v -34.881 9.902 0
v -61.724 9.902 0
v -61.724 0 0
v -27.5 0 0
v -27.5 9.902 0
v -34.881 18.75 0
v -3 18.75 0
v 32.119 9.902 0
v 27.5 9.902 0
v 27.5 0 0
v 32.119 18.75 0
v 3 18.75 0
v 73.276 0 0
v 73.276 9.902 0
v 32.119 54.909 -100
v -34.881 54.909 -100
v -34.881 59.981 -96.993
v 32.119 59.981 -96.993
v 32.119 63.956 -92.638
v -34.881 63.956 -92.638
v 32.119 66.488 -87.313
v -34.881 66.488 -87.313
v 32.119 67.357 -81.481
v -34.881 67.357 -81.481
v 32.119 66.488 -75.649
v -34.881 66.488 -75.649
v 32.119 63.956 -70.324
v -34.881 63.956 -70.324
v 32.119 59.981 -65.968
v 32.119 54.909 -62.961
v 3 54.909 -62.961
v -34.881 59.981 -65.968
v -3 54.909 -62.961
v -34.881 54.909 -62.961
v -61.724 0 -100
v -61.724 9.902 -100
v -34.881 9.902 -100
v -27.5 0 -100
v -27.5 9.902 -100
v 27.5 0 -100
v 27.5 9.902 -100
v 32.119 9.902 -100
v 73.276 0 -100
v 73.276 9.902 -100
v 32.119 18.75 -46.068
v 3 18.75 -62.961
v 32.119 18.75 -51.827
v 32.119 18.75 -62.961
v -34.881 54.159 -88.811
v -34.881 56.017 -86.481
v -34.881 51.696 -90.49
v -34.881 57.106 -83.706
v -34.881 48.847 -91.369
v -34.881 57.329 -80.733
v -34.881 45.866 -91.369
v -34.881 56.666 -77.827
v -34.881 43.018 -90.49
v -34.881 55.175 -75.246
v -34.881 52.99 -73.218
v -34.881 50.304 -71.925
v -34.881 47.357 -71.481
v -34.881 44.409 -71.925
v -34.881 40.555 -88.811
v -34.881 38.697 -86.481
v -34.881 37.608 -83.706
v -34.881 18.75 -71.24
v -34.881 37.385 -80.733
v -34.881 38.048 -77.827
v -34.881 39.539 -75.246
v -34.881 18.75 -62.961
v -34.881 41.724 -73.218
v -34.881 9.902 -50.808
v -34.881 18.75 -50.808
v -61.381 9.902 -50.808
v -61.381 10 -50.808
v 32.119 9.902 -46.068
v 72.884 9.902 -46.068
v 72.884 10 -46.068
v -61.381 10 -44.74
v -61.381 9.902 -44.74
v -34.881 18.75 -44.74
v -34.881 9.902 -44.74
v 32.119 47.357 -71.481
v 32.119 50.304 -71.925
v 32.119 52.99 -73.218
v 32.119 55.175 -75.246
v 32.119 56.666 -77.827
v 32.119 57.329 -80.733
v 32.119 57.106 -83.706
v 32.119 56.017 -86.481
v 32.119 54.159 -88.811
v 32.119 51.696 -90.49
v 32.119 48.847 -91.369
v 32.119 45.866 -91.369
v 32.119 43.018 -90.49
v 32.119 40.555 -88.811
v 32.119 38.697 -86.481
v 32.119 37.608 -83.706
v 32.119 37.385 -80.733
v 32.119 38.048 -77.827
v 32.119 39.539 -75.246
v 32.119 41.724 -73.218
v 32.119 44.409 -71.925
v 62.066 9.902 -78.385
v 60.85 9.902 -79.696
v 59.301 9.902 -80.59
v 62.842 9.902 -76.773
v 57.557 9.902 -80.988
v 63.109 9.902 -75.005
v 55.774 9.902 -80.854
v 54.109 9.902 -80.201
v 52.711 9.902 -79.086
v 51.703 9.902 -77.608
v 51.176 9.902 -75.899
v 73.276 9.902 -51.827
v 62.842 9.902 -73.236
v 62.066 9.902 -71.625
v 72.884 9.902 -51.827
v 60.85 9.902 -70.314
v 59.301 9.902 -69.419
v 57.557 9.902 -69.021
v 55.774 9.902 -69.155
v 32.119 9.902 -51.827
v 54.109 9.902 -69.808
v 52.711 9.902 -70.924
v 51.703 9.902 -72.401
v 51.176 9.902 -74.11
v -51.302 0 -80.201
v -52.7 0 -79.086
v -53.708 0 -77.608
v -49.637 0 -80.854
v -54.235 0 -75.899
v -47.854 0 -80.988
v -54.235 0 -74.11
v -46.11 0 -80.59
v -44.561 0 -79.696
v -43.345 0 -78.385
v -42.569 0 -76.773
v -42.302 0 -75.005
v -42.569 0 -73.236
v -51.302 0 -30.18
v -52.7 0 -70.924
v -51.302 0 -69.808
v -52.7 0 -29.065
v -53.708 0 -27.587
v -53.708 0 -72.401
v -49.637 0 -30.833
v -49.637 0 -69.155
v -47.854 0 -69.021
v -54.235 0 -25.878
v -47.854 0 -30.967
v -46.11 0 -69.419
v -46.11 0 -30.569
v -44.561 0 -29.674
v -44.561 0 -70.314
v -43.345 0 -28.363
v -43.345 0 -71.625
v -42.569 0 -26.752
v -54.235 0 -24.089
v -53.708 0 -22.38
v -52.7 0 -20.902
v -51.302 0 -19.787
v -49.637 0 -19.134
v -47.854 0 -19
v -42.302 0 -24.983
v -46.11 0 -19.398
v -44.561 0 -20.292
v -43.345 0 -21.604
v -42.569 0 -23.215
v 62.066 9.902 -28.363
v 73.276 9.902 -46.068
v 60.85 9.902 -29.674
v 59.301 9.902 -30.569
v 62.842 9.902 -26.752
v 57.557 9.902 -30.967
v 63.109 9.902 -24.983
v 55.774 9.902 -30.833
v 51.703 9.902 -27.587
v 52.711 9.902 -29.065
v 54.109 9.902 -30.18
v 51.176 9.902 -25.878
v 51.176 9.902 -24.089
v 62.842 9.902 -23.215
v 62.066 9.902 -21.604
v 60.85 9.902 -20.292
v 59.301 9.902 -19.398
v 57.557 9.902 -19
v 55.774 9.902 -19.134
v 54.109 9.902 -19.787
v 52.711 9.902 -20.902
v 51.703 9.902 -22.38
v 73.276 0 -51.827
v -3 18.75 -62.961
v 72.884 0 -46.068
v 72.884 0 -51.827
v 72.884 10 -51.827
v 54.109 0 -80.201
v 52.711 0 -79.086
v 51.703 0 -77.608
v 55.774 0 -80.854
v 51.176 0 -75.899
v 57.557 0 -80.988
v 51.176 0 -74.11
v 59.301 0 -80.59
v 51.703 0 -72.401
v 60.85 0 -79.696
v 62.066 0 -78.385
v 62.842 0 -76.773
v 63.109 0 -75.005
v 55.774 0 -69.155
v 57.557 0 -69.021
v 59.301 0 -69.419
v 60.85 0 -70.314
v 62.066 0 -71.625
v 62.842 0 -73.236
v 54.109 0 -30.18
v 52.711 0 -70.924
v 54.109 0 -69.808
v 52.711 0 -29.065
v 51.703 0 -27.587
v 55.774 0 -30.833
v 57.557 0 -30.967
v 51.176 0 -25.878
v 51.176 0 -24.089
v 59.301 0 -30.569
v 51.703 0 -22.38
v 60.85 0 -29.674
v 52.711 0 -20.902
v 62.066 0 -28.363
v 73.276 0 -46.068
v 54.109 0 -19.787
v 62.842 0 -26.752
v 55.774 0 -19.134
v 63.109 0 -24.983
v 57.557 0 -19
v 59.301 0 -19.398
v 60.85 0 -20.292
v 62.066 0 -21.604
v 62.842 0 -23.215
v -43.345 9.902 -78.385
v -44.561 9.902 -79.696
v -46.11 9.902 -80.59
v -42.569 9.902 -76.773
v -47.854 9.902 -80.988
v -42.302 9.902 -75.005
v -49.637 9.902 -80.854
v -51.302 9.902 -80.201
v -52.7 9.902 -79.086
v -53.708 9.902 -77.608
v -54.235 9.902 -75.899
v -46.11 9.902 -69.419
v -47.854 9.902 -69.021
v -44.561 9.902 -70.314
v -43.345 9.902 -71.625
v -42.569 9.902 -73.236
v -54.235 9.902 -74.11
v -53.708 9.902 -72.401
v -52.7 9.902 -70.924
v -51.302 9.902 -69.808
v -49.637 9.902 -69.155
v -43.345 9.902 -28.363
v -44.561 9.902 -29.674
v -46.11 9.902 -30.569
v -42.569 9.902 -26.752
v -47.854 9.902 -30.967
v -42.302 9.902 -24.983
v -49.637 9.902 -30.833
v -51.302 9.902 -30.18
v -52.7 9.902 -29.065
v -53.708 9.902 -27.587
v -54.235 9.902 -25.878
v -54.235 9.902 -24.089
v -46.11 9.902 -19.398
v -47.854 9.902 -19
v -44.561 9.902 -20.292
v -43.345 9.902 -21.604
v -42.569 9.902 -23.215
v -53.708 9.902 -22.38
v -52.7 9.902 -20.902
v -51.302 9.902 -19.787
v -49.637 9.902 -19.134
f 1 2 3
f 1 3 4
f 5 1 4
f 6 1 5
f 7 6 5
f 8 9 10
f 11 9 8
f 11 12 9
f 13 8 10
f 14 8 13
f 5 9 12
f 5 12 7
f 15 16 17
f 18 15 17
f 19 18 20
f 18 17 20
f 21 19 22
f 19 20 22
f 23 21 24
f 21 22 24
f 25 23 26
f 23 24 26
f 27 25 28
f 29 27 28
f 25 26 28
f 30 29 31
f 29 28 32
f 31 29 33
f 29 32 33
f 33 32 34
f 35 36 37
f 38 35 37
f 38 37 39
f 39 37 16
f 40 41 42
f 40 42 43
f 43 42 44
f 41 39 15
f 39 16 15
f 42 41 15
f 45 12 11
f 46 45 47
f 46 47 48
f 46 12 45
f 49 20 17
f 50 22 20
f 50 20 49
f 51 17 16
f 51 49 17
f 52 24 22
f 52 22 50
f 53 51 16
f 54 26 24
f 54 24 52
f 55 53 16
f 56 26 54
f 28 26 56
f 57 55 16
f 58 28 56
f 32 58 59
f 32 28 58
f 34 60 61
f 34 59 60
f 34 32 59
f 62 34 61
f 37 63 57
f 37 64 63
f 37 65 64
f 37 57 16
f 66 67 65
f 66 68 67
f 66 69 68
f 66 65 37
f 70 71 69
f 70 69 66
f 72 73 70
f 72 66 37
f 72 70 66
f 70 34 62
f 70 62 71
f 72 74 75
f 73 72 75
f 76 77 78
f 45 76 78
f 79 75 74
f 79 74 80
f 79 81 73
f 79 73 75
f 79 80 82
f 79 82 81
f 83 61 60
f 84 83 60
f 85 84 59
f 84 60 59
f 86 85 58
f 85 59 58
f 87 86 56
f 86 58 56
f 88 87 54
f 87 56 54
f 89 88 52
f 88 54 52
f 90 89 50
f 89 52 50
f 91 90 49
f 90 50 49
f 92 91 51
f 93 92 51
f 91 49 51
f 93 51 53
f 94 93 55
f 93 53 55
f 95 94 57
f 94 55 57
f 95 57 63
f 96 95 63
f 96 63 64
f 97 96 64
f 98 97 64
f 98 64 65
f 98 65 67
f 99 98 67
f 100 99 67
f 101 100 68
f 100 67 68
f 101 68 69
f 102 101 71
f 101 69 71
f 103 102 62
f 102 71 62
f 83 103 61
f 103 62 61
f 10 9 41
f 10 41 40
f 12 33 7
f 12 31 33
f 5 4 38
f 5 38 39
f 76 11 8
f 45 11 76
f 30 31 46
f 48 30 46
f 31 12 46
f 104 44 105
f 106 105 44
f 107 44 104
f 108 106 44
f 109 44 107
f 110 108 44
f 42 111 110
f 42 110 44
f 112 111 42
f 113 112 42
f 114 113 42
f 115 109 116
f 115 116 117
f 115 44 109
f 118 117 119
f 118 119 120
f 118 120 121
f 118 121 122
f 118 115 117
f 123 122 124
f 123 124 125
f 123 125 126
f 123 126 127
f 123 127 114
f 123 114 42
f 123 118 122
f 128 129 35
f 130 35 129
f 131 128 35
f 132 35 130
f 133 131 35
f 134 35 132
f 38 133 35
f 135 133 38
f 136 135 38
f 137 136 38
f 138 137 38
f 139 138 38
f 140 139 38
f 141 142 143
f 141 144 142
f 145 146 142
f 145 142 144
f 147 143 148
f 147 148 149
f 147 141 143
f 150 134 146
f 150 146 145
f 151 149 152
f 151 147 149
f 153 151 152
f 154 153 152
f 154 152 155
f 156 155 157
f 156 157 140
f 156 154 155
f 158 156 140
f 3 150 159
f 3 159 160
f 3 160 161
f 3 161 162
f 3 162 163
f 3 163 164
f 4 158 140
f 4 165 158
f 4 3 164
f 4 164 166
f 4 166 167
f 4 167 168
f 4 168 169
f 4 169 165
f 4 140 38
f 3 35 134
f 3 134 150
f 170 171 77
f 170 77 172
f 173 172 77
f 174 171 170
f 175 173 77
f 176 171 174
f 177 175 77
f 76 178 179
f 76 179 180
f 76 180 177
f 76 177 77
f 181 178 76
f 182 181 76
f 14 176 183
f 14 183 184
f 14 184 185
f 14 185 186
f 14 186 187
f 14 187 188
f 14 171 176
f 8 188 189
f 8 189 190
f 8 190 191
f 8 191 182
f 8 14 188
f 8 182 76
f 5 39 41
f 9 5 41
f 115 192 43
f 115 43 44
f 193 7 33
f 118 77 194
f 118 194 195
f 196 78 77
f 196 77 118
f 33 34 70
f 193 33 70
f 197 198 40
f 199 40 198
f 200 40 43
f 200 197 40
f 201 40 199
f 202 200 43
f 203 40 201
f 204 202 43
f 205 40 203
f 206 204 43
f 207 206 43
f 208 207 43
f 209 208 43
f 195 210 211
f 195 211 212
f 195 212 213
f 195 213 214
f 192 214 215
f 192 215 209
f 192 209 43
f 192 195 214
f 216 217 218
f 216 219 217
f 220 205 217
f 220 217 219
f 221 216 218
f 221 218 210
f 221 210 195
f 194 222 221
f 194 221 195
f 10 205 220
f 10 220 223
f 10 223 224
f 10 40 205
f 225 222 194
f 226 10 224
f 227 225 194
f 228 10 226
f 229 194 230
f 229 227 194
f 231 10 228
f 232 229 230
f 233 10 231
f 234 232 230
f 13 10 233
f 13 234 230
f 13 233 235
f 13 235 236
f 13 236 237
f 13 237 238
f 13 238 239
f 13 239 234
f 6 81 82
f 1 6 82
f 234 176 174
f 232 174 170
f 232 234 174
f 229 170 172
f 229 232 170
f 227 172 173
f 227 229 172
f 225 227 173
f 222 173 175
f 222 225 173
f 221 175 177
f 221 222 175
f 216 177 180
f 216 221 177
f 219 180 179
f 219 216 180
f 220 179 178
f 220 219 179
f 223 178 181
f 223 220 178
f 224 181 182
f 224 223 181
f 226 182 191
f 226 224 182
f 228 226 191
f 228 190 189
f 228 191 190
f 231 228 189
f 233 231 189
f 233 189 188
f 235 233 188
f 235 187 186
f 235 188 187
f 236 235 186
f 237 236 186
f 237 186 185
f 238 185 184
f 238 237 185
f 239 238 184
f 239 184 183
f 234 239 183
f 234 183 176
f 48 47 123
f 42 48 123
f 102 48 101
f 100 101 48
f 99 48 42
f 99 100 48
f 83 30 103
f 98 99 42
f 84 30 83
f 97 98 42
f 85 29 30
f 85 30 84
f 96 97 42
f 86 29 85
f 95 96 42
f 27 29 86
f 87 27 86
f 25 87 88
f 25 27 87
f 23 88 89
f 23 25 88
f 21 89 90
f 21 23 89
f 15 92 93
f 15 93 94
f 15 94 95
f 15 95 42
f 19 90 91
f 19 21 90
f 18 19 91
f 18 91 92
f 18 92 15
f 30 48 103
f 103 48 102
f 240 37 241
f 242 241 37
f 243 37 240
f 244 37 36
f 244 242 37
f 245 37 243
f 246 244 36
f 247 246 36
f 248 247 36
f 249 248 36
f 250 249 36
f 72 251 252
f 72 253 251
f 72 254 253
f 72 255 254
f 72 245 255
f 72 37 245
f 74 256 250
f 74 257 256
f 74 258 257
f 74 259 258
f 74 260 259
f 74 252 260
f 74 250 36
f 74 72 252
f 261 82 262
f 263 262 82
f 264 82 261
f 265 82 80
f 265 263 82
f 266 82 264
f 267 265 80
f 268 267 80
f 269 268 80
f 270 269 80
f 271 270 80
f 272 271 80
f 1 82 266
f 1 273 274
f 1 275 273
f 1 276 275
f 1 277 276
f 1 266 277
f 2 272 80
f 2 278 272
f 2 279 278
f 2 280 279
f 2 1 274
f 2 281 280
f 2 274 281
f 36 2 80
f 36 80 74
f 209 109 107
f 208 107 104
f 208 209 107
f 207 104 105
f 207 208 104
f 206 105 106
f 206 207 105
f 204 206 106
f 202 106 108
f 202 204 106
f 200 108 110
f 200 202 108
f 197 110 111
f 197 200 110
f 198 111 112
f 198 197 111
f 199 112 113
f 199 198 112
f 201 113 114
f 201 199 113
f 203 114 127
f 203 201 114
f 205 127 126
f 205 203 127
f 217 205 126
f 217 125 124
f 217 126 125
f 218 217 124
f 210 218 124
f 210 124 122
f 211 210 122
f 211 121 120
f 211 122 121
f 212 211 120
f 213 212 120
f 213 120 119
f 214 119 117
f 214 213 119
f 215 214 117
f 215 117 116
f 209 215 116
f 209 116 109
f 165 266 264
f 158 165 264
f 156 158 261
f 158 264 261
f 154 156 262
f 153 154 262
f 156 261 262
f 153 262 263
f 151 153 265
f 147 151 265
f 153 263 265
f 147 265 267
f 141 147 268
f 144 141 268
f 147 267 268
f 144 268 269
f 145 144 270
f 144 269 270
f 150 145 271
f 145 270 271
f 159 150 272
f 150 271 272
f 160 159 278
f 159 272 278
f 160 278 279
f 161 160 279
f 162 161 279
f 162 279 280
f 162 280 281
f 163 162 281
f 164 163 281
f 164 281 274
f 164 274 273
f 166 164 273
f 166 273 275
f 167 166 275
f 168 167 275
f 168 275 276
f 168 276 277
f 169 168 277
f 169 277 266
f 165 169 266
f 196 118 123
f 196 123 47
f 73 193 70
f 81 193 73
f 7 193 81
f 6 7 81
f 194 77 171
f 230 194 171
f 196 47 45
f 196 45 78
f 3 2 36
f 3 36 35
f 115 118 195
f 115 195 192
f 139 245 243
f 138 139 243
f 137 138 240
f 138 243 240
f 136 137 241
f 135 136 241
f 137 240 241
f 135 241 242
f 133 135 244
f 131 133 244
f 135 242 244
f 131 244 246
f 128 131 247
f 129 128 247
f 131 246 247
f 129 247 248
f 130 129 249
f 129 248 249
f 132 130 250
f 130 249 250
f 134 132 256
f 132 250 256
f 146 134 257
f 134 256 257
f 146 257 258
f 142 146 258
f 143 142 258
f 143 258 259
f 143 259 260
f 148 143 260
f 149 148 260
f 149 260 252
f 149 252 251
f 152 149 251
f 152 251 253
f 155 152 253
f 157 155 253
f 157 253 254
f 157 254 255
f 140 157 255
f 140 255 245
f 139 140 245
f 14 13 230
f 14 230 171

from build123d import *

# Parameters (mm, degrees)
BOSS_EXTRUDE1_DEPTH     = 100
SKETCH2_R               = 10
BOSS_EXTRUDE2_DEPTH     = 67
SKETCH3_R               = 6
CUT_EXTRUDE1_DEPTH      = 67
CUT_EXTRUDE2_DEPTH      = 67
CUT_EXTRUDE2_DEPTH_BACK = 67
SKETCH4_R               = 6
BOSS_EXTRUDE3_DEPTH     = 3
SKETCH9_W               = 6.067764808
SKETCH9_H               = 8.847787213
BOSS_EXTRUDE4_DEPTH     = 26.5
CUT_EXTRUDE3_DEPTH      = 26.5
SKETCH11_W              = 5.758839732
SKETCH11_H              = 8.847787213
BOSS_EXTRUDE5_DEPTH     = 42
CUT_EXTRUDE4_DEPTH      = 42
SKETCH13_W              = 1.235315599
SKETCH13_H              = 5.758839732
CUT_EXTRUDE6_DEPTH      = 42


with BuildPart() as part:
    # Sketch1 → Boss-Extrude1 (new body)
    with BuildSketch(Plane.XY):
        Polygon((-61.723716381, 0), (-27.5, 0), (-27.5, 9.902200489), (27.5, 9.902200489), (27.5, 0), (73.276283619, 0), (73.276283619, 9.902200489), (31.668314846, 9.902200489), (31.668314846, 18.749987702), (-34.880531234, 18.749987702), (-34.880531234, 9.902200489), (-61.723716381, 9.902200489), align=None)
    extrude(amount=-BOSS_EXTRUDE1_DEPTH)

    # Sketch2 → Boss-Extrude2 (add)
    with BuildSketch(Plane.ZY.offset(34.880531234)):
        with BuildLine():
            Line((-100, 9.902200489), (-100, 54.908843962))
            ThreePointArc((-100, 54.908843962), (-81.480595065, 67.356914351), (-62.96119013, 54.908843962))
            Line((-62.96119013, 54.908843962), (-62.96119013, 18.749987702))
            Line((-62.96119013, 18.749987702), (0, 18.749987702))
            Line((0, 18.749987702), (0, 9.902200489))
            Line((0, 9.902200489), (-100, 9.902200489))
        make_face()
        with Locations((-81.480595065, 47.356914351)):
            Circle(SKETCH2_R, mode=Mode.SUBTRACT)
    extrude(amount=-BOSS_EXTRUDE2_DEPTH)

    # Sketch3 → Cut-Extrude1 (cut)
    with BuildSketch(Plane(origin=(0, 9.902200489, 0), x_dir=(1, 0, 0), z_dir=(0, 1, 0))):
        with Locations((-48.302123808, 24.983488629)):
            Circle(SKETCH3_R)
        with Locations((-48.302123808, 75.004643802)):
            Circle(SKETCH3_R)
    extrude(amount=-CUT_EXTRUDE1_DEPTH, mode=Mode.SUBTRACT)

    # Sketch4 → Cut-Extrude2 (cut, two sides: drawn at the far end of the back side and taken through both)
    with BuildSketch(Plane(origin=(0, 0, 0), x_dir=(1, 0, 0), z_dir=(0, 1, 0)).offset(-CUT_EXTRUDE2_DEPTH_BACK)):
        with Locations((57.109031968, 75.004643802)):
            Circle(SKETCH4_R)
        with Locations((57.109031968, 24.983488629)):
            Circle(SKETCH4_R)
    extrude(amount=CUT_EXTRUDE2_DEPTH + CUT_EXTRUDE2_DEPTH_BACK, mode=Mode.SUBTRACT)

    # Sketch5 → Boss-Extrude3 (add, symmetric)
    with BuildSketch(Plane(origin=(0, 0, 0), x_dir=(0, 0, -1), z_dir=(1, 0, 0))):
        Polygon((62.96119013, 54.908843962), (0, 18.749987702), (62.96119013, 18.749987702), align=None)
    extrude(amount=BOSS_EXTRUDE3_DEPTH, both=True)

    # Sketch9 → Boss-Extrude4 (add)
    with BuildSketch(Plane.ZY.offset(34.880531234)):
        with Locations((-47.773735316, 14.326094096)):
            Rectangle(SKETCH9_W, SKETCH9_H)
    extrude(amount=BOSS_EXTRUDE4_DEPTH)

    # Sketch10 → Cut-Extrude3 (cut)
    with BuildSketch(Plane.XY.offset(-44.739852912)):
        Polygon((-34.880531234, 18.749987702), (-61.380531234, 10), (-61.380531234, 18.749987702), align=None)
    extrude(amount=-CUT_EXTRUDE3_DEPTH, mode=Mode.SUBTRACT)

    # Sketch11 → Boss-Extrude5 (add)
    with BuildSketch(Plane(origin=(32.119468766, 0, 0), x_dir=(0, 0, -1), z_dir=(1, 0, 0))):
        with Locations((48.947532941, 14.326094096)):
            Rectangle(SKETCH11_W, SKETCH11_H)
    extrude(amount=BOSS_EXTRUDE5_DEPTH)

    # Sketch12 → Cut-Extrude4 (cut)
    with BuildSketch(Plane(origin=(0, 0, -51.826952807), x_dir=(-1, 0, 0), z_dir=(0, 0, -1))):
        Polygon((-32.119468766, 18.749987702), (-72.884153167, 10), (-74.975846316, 10), (-74.119468766, 18.749987702), align=None)
    extrude(amount=-CUT_EXTRUDE4_DEPTH, mode=Mode.SUBTRACT)

    # Sketch13 → Cut-Extrude6 (cut)
    with BuildSketch(Plane(origin=(0, 10, 0), x_dir=(1, 0, 0), z_dir=(0, 1, 0))):
        with Locations((73.501810967, 48.947532941)):
            Rectangle(SKETCH13_W, SKETCH13_H)
    extrude(amount=-CUT_EXTRUDE6_DEPTH, mode=Mode.SUBTRACT)


solid = part.part
